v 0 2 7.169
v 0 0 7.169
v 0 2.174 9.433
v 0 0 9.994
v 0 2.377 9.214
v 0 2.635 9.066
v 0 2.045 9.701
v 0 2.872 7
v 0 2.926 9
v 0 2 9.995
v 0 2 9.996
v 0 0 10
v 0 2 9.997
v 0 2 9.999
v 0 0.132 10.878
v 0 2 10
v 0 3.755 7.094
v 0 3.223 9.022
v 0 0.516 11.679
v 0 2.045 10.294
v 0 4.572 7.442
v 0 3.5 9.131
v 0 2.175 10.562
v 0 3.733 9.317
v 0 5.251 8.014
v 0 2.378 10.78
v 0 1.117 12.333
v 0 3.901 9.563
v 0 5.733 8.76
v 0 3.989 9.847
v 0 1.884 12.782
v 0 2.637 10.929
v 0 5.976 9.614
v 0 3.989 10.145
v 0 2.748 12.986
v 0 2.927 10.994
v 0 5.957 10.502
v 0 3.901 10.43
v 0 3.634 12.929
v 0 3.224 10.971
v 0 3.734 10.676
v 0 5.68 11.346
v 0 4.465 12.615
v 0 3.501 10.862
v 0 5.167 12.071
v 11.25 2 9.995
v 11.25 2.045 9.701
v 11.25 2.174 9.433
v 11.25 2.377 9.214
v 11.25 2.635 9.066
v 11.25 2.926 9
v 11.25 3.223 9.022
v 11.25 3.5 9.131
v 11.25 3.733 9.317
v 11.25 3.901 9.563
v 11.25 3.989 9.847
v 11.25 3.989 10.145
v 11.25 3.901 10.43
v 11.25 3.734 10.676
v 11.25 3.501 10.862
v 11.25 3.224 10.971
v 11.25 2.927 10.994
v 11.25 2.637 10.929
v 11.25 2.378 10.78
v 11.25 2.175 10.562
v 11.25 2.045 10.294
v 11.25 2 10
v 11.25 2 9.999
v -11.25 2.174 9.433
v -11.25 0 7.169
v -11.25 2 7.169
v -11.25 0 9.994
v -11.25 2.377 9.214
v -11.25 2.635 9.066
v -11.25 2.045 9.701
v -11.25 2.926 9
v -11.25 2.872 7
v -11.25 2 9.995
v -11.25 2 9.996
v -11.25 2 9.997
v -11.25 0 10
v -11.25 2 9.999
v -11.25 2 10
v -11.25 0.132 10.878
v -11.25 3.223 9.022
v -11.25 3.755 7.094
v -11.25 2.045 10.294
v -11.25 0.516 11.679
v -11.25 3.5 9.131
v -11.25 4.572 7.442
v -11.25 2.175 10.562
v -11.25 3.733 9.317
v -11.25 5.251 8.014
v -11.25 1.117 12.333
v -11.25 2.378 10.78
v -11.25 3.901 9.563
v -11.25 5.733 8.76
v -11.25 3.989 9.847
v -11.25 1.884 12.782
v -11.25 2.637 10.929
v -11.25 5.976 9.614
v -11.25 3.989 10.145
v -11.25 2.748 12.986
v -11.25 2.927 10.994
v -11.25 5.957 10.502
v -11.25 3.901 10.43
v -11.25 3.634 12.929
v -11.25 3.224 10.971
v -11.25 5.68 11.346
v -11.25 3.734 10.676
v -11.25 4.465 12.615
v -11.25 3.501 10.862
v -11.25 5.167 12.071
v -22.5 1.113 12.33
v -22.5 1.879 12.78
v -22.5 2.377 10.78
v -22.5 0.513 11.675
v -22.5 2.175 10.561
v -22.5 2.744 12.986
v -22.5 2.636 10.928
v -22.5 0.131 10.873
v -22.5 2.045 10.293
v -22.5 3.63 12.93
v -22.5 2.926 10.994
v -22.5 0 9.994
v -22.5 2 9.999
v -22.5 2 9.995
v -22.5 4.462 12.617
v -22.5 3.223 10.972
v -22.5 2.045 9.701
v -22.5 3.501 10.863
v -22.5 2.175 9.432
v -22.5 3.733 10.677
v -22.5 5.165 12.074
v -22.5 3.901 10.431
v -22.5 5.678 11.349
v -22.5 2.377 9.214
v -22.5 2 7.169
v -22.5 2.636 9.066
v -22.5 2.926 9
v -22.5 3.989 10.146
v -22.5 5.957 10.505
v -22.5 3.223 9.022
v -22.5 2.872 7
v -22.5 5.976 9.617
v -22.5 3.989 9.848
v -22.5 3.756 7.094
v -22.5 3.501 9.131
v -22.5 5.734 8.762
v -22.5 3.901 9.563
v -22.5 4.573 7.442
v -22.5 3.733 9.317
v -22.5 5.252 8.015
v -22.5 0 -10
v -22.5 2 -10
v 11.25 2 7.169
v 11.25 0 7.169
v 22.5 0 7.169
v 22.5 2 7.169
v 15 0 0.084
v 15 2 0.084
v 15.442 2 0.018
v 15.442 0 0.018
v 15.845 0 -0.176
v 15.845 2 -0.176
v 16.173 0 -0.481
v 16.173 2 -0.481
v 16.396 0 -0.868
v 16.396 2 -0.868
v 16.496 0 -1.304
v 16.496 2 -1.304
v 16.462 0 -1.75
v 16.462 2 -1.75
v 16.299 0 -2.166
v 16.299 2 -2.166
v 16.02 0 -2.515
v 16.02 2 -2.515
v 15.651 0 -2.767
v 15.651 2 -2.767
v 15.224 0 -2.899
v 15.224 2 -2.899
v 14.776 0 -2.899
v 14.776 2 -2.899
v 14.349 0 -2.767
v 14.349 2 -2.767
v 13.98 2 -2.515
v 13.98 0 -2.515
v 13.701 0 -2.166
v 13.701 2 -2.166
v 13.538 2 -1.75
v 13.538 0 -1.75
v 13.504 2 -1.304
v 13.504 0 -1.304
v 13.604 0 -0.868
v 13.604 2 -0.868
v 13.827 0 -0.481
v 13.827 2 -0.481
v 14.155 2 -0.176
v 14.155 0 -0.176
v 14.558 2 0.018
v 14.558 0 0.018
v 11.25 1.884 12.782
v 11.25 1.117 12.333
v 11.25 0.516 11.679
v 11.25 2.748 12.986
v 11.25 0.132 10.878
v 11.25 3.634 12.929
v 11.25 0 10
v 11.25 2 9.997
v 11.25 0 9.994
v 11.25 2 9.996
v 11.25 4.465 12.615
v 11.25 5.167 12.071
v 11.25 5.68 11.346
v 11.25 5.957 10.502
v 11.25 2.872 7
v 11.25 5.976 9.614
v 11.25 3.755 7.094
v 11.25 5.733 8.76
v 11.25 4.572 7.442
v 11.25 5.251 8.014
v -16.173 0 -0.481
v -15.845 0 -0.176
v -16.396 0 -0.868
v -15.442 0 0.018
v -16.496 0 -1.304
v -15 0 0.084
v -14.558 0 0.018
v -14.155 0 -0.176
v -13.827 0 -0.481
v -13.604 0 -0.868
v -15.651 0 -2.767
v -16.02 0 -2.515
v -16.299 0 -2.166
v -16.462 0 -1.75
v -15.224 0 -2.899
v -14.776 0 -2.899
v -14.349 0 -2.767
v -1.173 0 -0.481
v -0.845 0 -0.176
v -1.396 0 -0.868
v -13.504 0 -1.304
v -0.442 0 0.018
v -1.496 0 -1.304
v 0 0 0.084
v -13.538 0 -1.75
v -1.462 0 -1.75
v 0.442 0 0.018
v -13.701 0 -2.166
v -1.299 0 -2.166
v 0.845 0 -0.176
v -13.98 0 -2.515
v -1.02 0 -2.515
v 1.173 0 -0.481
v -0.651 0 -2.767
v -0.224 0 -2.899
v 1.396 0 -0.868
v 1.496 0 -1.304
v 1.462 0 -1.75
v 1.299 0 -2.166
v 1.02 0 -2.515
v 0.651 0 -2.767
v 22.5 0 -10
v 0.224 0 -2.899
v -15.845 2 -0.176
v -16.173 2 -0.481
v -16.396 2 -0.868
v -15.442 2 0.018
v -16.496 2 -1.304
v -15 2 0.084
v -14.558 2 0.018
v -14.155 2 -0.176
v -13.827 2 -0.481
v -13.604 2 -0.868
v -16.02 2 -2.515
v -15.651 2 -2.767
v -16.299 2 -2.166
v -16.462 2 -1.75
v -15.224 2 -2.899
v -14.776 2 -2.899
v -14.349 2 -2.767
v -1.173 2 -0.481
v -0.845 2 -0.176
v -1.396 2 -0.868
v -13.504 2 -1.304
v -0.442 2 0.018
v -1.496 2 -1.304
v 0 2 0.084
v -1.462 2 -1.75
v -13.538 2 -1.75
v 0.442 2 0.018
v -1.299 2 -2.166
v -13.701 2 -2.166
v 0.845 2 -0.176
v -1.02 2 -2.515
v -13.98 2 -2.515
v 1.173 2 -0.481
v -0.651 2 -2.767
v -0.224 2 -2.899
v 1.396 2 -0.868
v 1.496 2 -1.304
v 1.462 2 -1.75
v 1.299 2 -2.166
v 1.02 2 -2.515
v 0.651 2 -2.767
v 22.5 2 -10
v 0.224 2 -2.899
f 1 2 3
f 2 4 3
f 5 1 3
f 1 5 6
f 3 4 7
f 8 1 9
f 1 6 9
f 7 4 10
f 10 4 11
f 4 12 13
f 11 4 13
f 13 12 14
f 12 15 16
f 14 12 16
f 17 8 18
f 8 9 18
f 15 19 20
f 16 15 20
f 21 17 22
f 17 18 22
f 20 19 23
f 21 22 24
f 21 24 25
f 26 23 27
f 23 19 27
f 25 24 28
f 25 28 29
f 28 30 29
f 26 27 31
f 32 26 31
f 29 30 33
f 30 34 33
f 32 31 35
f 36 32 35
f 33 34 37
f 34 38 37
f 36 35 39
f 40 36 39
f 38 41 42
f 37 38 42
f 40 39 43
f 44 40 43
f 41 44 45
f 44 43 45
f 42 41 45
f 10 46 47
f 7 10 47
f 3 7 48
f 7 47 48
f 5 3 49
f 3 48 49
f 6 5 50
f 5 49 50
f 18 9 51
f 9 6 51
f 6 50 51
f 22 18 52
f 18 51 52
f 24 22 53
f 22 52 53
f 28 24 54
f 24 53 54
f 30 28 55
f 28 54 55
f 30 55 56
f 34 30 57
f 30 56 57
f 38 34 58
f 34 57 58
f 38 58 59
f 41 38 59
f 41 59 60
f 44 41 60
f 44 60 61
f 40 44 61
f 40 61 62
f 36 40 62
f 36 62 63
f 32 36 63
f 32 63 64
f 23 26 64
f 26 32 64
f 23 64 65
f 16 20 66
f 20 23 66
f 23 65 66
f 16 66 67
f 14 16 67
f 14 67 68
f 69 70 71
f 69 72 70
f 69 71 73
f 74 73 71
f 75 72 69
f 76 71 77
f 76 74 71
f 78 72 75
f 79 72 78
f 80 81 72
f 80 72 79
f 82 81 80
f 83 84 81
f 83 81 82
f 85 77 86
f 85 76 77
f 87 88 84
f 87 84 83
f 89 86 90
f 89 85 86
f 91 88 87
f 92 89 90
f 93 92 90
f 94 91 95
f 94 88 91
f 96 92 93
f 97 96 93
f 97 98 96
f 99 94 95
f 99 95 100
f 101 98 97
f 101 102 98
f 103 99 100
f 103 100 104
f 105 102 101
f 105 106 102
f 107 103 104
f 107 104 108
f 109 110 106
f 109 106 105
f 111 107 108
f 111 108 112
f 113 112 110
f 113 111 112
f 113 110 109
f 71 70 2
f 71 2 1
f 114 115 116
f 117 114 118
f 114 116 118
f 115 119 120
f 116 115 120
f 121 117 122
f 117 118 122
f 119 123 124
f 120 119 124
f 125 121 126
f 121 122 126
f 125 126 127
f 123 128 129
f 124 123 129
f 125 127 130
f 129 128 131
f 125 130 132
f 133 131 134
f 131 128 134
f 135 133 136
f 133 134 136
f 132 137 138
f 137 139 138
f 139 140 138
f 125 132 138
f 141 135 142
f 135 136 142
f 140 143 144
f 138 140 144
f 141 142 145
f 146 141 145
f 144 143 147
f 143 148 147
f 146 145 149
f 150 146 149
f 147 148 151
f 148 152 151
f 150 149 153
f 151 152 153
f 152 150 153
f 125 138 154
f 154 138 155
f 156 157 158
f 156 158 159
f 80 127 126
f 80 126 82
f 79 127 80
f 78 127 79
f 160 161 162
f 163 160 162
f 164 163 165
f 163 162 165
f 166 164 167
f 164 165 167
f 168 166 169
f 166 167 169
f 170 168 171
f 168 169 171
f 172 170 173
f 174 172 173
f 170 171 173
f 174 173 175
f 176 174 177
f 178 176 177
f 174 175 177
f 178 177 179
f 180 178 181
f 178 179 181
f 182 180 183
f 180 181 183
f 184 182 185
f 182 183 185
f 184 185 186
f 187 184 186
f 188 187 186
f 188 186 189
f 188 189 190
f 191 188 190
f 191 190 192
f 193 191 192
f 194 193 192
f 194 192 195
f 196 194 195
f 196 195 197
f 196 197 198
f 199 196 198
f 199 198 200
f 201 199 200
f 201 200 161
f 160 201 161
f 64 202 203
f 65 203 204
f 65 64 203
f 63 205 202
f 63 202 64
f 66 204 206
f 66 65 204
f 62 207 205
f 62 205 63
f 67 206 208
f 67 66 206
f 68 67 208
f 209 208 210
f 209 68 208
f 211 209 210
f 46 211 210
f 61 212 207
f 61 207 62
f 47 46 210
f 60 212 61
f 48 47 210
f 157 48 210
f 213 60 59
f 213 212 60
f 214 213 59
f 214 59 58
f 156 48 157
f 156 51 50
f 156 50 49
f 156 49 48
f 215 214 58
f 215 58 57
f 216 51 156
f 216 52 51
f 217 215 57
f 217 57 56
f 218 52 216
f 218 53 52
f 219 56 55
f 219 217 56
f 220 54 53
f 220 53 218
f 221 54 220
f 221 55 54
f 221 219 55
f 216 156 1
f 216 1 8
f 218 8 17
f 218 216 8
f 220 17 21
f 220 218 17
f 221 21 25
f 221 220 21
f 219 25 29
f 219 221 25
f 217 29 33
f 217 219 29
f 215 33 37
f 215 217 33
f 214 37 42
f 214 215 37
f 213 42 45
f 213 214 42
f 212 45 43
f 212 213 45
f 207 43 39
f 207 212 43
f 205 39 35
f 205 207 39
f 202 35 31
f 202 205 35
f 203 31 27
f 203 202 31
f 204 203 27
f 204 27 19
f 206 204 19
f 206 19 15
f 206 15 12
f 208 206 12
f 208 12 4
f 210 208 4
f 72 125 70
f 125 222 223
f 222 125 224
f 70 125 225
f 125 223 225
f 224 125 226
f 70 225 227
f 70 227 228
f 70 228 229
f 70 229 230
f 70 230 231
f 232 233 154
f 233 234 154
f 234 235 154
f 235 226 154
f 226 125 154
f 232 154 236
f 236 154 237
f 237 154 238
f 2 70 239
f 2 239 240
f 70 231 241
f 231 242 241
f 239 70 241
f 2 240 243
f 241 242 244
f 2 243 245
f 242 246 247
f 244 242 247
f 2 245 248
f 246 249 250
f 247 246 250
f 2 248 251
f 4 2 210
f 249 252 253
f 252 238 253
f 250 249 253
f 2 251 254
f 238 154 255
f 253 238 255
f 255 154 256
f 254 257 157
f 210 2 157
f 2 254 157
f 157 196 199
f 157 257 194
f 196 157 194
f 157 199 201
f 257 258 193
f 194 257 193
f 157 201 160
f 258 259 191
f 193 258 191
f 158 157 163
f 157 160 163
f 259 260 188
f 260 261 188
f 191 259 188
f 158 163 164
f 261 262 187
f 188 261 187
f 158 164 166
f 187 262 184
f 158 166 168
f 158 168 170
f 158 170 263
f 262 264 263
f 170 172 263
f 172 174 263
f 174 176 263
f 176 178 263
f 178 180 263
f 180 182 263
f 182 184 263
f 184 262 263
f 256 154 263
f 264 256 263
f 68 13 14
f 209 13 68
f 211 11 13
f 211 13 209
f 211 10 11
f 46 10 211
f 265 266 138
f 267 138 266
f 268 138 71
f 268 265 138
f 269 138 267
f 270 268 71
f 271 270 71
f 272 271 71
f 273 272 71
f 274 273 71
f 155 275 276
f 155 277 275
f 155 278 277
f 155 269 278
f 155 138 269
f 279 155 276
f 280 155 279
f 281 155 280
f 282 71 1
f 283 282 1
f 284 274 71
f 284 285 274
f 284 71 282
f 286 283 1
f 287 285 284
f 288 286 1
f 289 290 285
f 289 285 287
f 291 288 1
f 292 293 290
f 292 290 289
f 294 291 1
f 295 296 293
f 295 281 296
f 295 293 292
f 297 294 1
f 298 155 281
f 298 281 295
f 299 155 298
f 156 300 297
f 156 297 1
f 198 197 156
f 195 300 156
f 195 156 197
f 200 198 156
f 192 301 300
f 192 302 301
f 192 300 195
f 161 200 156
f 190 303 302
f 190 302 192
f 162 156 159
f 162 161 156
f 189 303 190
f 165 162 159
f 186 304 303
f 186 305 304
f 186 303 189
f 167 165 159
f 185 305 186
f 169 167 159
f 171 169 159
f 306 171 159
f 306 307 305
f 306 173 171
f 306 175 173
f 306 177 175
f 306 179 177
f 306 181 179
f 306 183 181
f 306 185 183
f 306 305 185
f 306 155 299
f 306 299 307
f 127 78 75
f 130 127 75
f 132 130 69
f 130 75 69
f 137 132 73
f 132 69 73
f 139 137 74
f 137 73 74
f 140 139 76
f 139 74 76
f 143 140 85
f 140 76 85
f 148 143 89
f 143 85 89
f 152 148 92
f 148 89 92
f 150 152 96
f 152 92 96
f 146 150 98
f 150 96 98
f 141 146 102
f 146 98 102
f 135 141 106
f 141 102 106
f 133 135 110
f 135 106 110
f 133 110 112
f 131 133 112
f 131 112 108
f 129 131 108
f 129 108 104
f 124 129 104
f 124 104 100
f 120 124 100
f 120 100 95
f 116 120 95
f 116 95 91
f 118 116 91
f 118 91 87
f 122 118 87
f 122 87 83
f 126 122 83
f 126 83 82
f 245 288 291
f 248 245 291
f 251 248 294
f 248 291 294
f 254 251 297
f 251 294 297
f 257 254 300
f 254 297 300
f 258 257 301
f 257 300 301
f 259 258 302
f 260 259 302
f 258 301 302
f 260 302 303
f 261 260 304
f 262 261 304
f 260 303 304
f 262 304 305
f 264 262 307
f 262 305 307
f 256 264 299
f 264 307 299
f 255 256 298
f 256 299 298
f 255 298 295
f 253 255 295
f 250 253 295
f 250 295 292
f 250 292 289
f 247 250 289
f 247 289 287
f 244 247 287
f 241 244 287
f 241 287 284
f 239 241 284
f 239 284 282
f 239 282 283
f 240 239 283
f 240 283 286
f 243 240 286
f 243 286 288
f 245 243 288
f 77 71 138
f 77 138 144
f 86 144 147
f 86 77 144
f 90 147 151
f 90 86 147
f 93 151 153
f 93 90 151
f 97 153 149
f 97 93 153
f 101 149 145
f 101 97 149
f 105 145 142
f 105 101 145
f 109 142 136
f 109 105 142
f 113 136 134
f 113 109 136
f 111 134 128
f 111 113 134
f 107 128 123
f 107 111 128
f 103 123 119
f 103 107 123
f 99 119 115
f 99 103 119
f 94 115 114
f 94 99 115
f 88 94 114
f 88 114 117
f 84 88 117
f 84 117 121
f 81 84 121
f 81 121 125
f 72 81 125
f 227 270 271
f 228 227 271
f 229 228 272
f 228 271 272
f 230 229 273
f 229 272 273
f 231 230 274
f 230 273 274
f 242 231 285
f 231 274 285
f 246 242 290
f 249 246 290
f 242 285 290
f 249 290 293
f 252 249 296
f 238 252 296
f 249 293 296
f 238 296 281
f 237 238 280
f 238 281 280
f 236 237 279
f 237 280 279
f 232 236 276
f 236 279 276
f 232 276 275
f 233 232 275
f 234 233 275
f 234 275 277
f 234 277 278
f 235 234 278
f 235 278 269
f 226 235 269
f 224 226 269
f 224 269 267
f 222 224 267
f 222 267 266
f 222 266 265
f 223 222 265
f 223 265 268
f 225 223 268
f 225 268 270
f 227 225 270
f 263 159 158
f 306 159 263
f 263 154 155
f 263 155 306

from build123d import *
from OCP.BRepAlgoAPI import BRepAlgoAPI_Cut
from OCP.TopTools import TopTools_ListOfShape

# Parameters (mm, degrees)
IZIM1_W                     = 45
IZIM1_H                     = 20
Y_KSEKLIK_EKSTR_ZYON1_DEPTH = 2
IZIM2_R                     = 3
IZIM2_R_2                   = 1
Y_KSEKLIK_EKSTR_ZYON2_DEPTH = 45
IZIM4_R                     = 1.5
KES_EKSTR_ZYON1_DEPTH       = 45
L_O_ALTMA1_COUNT            = 3
L_O_ALTMA1_PITCH            = 15
KES_EKSTR_ZYON3_START       = -11.25
KES_EKSTR_ZYON3_DEPTH       = 11.25
L_O_ALTMA7_START            = -11.25
L_O_ALTMA7_DEPTH            = 11.25


with BuildPart() as part:
    # Çizim1 → Yükseklik-Ekstrüzyon1 (new body)
    with BuildSketch(Plane(origin=(0, 0, 0), x_dir=(1, 0, 0), z_dir=(0, 1, 0))):
        Rectangle(IZIM1_W, IZIM1_H)
    extrude(amount=Y_KSEKLIK_EKSTR_ZYON1_DEPTH)

    # Çizim2 → Yükseklik-Ekstrüzyon2 (add)
    with BuildSketch(Plane(origin=(22.5, 0, 0), x_dir=(0, 0, -1), z_dir=(1, 0, 0))):
        with Locations((-9.996930096, 2.999998429)):
            Circle(IZIM2_R)
        with Locations((-9.996930096, 2.999998429)):
            Circle(IZIM2_R_2, mode=Mode.SUBTRACT)
    extrude(amount=-Y_KSEKLIK_EKSTR_ZYON2_DEPTH)

    # Çizim4 → Kes-Ekstrüzyon1 (cut)
    with BuildSketch(Plane(origin=(0, 2, 0), x_dir=(1, 0, 0), z_dir=(0, 1, 0))):
        with Locations(Location((-15, 1.415748792, 0), (0, 0, 270))):
            Circle(IZIM4_R)
    kes_ekstr_zyon1 = extrude(amount=-KES_EKSTR_ZYON1_DEPTH, mode=Mode.SUBTRACT)

    # LÇoğaltma1: Kes-Ekstrüzyon1 ×3
    with Locations(*[(i * L_O_ALTMA1_PITCH, 0, 0) for i in range(1, L_O_ALTMA1_COUNT)]):
        add(kes_ekstr_zyon1, mode=Mode.SUBTRACT)


with BuildPart() as kes_ekstr_zyon3_tool:
    # Kes-Ekstrüzyon3: read off the stored shape, not the designer's step
    # Kes-Ekstrüzyon3 outline → Kes-Ekstrüzyon3 (new body)
    with BuildSketch(Plane(origin=(22.5, 0, 0), x_dir=(0, 0, -1), z_dir=(1, 0, 0)).offset(KES_EKSTR_ZYON3_START)):
        with BuildLine():
            Line((-7.168502416, 0), (-7.168502416, 2))
            ThreePointArc((-7.168502416, 2), (-11.727728074, 5.450373576), (-10, 0))
            Line((-10, 0), (-7.168502416, 0))
        make_face()
        with BuildLine():
            Line((-9.996930096, 1.999998429), (-9.99999999, 2.000003141))
            ThreePointArc((-9.99999999, 2.000003141), (-9.995395236, 3.999997251), (-9.996930096, 1.999998429))
        make_face(mode=Mode.SUBTRACT)
    extrude(amount=KES_EKSTR_ZYON3_DEPTH)


with BuildPart() as part_1:
    add(part.part)

    # Kes-Ekstrüzyon3: cut by kes_ekstr_zyon3_tool, with a tolerance
    kes_ekstr_zyon3_stock = TopTools_ListOfShape()
    kes_ekstr_zyon3_stock.Append(part_1.part.wrapped)
    kes_ekstr_zyon3_tools = TopTools_ListOfShape()
    kes_ekstr_zyon3_tools.Append(kes_ekstr_zyon3_tool.part.wrapped)
    kes_ekstr_zyon3_cut = BRepAlgoAPI_Cut()
    kes_ekstr_zyon3_cut.SetArguments(kes_ekstr_zyon3_stock)
    kes_ekstr_zyon3_cut.SetTools(kes_ekstr_zyon3_tools)
    kes_ekstr_zyon3_cut.SetFuzzyValue(0.00001)
    kes_ekstr_zyon3_cut.Build()
    add(Compound.cast(kes_ekstr_zyon3_cut.Shape()).solids(), mode=Mode.REPLACE)


with BuildPart() as l_o_altma7_tool:
    # LÇoğaltma7: read off the stored shape, not the designer's step
    # LÇoğaltma7 outline → LÇoğaltma7 (new body)
    with BuildSketch(Plane.YZ.offset(L_O_ALTMA7_START)):
        with BuildLine():
            Line((0, 7.168502416), (2, 7.168502416))
            ThreePointArc((2, 7.168502416), (5.450373576, 11.727728074), (0, 10))
            Line((0, 10), (0, 7.168502416))
        make_face()
        with BuildLine():
            Line((1.999998429, 9.996930096), (2.000003141, 9.99999999))
            ThreePointArc((2.000003141, 9.99999999), (3.999997251, 9.995395236), (1.999998429, 9.996930096))
        make_face(mode=Mode.SUBTRACT)
    extrude(amount=L_O_ALTMA7_DEPTH)


with BuildPart() as part_2:
    add(part_1.part)

    # LÇoğaltma7: cut by l_o_altma7_tool, with a tolerance
    l_o_altma7_stock = TopTools_ListOfShape()
    l_o_altma7_stock.Append(part_2.part.wrapped)
    l_o_altma7_tools = TopTools_ListOfShape()
    l_o_altma7_tools.Append(l_o_altma7_tool.part.wrapped)
    l_o_altma7_cut = BRepAlgoAPI_Cut()
    l_o_altma7_cut.SetArguments(l_o_altma7_stock)
    l_o_altma7_cut.SetTools(l_o_altma7_tools)
    l_o_altma7_cut.SetFuzzyValue(0.00001)
    l_o_altma7_cut.Build()
    add(Compound.cast(l_o_altma7_cut.Shape()).solids(), mode=Mode.REPLACE)


solid = part_2.part
